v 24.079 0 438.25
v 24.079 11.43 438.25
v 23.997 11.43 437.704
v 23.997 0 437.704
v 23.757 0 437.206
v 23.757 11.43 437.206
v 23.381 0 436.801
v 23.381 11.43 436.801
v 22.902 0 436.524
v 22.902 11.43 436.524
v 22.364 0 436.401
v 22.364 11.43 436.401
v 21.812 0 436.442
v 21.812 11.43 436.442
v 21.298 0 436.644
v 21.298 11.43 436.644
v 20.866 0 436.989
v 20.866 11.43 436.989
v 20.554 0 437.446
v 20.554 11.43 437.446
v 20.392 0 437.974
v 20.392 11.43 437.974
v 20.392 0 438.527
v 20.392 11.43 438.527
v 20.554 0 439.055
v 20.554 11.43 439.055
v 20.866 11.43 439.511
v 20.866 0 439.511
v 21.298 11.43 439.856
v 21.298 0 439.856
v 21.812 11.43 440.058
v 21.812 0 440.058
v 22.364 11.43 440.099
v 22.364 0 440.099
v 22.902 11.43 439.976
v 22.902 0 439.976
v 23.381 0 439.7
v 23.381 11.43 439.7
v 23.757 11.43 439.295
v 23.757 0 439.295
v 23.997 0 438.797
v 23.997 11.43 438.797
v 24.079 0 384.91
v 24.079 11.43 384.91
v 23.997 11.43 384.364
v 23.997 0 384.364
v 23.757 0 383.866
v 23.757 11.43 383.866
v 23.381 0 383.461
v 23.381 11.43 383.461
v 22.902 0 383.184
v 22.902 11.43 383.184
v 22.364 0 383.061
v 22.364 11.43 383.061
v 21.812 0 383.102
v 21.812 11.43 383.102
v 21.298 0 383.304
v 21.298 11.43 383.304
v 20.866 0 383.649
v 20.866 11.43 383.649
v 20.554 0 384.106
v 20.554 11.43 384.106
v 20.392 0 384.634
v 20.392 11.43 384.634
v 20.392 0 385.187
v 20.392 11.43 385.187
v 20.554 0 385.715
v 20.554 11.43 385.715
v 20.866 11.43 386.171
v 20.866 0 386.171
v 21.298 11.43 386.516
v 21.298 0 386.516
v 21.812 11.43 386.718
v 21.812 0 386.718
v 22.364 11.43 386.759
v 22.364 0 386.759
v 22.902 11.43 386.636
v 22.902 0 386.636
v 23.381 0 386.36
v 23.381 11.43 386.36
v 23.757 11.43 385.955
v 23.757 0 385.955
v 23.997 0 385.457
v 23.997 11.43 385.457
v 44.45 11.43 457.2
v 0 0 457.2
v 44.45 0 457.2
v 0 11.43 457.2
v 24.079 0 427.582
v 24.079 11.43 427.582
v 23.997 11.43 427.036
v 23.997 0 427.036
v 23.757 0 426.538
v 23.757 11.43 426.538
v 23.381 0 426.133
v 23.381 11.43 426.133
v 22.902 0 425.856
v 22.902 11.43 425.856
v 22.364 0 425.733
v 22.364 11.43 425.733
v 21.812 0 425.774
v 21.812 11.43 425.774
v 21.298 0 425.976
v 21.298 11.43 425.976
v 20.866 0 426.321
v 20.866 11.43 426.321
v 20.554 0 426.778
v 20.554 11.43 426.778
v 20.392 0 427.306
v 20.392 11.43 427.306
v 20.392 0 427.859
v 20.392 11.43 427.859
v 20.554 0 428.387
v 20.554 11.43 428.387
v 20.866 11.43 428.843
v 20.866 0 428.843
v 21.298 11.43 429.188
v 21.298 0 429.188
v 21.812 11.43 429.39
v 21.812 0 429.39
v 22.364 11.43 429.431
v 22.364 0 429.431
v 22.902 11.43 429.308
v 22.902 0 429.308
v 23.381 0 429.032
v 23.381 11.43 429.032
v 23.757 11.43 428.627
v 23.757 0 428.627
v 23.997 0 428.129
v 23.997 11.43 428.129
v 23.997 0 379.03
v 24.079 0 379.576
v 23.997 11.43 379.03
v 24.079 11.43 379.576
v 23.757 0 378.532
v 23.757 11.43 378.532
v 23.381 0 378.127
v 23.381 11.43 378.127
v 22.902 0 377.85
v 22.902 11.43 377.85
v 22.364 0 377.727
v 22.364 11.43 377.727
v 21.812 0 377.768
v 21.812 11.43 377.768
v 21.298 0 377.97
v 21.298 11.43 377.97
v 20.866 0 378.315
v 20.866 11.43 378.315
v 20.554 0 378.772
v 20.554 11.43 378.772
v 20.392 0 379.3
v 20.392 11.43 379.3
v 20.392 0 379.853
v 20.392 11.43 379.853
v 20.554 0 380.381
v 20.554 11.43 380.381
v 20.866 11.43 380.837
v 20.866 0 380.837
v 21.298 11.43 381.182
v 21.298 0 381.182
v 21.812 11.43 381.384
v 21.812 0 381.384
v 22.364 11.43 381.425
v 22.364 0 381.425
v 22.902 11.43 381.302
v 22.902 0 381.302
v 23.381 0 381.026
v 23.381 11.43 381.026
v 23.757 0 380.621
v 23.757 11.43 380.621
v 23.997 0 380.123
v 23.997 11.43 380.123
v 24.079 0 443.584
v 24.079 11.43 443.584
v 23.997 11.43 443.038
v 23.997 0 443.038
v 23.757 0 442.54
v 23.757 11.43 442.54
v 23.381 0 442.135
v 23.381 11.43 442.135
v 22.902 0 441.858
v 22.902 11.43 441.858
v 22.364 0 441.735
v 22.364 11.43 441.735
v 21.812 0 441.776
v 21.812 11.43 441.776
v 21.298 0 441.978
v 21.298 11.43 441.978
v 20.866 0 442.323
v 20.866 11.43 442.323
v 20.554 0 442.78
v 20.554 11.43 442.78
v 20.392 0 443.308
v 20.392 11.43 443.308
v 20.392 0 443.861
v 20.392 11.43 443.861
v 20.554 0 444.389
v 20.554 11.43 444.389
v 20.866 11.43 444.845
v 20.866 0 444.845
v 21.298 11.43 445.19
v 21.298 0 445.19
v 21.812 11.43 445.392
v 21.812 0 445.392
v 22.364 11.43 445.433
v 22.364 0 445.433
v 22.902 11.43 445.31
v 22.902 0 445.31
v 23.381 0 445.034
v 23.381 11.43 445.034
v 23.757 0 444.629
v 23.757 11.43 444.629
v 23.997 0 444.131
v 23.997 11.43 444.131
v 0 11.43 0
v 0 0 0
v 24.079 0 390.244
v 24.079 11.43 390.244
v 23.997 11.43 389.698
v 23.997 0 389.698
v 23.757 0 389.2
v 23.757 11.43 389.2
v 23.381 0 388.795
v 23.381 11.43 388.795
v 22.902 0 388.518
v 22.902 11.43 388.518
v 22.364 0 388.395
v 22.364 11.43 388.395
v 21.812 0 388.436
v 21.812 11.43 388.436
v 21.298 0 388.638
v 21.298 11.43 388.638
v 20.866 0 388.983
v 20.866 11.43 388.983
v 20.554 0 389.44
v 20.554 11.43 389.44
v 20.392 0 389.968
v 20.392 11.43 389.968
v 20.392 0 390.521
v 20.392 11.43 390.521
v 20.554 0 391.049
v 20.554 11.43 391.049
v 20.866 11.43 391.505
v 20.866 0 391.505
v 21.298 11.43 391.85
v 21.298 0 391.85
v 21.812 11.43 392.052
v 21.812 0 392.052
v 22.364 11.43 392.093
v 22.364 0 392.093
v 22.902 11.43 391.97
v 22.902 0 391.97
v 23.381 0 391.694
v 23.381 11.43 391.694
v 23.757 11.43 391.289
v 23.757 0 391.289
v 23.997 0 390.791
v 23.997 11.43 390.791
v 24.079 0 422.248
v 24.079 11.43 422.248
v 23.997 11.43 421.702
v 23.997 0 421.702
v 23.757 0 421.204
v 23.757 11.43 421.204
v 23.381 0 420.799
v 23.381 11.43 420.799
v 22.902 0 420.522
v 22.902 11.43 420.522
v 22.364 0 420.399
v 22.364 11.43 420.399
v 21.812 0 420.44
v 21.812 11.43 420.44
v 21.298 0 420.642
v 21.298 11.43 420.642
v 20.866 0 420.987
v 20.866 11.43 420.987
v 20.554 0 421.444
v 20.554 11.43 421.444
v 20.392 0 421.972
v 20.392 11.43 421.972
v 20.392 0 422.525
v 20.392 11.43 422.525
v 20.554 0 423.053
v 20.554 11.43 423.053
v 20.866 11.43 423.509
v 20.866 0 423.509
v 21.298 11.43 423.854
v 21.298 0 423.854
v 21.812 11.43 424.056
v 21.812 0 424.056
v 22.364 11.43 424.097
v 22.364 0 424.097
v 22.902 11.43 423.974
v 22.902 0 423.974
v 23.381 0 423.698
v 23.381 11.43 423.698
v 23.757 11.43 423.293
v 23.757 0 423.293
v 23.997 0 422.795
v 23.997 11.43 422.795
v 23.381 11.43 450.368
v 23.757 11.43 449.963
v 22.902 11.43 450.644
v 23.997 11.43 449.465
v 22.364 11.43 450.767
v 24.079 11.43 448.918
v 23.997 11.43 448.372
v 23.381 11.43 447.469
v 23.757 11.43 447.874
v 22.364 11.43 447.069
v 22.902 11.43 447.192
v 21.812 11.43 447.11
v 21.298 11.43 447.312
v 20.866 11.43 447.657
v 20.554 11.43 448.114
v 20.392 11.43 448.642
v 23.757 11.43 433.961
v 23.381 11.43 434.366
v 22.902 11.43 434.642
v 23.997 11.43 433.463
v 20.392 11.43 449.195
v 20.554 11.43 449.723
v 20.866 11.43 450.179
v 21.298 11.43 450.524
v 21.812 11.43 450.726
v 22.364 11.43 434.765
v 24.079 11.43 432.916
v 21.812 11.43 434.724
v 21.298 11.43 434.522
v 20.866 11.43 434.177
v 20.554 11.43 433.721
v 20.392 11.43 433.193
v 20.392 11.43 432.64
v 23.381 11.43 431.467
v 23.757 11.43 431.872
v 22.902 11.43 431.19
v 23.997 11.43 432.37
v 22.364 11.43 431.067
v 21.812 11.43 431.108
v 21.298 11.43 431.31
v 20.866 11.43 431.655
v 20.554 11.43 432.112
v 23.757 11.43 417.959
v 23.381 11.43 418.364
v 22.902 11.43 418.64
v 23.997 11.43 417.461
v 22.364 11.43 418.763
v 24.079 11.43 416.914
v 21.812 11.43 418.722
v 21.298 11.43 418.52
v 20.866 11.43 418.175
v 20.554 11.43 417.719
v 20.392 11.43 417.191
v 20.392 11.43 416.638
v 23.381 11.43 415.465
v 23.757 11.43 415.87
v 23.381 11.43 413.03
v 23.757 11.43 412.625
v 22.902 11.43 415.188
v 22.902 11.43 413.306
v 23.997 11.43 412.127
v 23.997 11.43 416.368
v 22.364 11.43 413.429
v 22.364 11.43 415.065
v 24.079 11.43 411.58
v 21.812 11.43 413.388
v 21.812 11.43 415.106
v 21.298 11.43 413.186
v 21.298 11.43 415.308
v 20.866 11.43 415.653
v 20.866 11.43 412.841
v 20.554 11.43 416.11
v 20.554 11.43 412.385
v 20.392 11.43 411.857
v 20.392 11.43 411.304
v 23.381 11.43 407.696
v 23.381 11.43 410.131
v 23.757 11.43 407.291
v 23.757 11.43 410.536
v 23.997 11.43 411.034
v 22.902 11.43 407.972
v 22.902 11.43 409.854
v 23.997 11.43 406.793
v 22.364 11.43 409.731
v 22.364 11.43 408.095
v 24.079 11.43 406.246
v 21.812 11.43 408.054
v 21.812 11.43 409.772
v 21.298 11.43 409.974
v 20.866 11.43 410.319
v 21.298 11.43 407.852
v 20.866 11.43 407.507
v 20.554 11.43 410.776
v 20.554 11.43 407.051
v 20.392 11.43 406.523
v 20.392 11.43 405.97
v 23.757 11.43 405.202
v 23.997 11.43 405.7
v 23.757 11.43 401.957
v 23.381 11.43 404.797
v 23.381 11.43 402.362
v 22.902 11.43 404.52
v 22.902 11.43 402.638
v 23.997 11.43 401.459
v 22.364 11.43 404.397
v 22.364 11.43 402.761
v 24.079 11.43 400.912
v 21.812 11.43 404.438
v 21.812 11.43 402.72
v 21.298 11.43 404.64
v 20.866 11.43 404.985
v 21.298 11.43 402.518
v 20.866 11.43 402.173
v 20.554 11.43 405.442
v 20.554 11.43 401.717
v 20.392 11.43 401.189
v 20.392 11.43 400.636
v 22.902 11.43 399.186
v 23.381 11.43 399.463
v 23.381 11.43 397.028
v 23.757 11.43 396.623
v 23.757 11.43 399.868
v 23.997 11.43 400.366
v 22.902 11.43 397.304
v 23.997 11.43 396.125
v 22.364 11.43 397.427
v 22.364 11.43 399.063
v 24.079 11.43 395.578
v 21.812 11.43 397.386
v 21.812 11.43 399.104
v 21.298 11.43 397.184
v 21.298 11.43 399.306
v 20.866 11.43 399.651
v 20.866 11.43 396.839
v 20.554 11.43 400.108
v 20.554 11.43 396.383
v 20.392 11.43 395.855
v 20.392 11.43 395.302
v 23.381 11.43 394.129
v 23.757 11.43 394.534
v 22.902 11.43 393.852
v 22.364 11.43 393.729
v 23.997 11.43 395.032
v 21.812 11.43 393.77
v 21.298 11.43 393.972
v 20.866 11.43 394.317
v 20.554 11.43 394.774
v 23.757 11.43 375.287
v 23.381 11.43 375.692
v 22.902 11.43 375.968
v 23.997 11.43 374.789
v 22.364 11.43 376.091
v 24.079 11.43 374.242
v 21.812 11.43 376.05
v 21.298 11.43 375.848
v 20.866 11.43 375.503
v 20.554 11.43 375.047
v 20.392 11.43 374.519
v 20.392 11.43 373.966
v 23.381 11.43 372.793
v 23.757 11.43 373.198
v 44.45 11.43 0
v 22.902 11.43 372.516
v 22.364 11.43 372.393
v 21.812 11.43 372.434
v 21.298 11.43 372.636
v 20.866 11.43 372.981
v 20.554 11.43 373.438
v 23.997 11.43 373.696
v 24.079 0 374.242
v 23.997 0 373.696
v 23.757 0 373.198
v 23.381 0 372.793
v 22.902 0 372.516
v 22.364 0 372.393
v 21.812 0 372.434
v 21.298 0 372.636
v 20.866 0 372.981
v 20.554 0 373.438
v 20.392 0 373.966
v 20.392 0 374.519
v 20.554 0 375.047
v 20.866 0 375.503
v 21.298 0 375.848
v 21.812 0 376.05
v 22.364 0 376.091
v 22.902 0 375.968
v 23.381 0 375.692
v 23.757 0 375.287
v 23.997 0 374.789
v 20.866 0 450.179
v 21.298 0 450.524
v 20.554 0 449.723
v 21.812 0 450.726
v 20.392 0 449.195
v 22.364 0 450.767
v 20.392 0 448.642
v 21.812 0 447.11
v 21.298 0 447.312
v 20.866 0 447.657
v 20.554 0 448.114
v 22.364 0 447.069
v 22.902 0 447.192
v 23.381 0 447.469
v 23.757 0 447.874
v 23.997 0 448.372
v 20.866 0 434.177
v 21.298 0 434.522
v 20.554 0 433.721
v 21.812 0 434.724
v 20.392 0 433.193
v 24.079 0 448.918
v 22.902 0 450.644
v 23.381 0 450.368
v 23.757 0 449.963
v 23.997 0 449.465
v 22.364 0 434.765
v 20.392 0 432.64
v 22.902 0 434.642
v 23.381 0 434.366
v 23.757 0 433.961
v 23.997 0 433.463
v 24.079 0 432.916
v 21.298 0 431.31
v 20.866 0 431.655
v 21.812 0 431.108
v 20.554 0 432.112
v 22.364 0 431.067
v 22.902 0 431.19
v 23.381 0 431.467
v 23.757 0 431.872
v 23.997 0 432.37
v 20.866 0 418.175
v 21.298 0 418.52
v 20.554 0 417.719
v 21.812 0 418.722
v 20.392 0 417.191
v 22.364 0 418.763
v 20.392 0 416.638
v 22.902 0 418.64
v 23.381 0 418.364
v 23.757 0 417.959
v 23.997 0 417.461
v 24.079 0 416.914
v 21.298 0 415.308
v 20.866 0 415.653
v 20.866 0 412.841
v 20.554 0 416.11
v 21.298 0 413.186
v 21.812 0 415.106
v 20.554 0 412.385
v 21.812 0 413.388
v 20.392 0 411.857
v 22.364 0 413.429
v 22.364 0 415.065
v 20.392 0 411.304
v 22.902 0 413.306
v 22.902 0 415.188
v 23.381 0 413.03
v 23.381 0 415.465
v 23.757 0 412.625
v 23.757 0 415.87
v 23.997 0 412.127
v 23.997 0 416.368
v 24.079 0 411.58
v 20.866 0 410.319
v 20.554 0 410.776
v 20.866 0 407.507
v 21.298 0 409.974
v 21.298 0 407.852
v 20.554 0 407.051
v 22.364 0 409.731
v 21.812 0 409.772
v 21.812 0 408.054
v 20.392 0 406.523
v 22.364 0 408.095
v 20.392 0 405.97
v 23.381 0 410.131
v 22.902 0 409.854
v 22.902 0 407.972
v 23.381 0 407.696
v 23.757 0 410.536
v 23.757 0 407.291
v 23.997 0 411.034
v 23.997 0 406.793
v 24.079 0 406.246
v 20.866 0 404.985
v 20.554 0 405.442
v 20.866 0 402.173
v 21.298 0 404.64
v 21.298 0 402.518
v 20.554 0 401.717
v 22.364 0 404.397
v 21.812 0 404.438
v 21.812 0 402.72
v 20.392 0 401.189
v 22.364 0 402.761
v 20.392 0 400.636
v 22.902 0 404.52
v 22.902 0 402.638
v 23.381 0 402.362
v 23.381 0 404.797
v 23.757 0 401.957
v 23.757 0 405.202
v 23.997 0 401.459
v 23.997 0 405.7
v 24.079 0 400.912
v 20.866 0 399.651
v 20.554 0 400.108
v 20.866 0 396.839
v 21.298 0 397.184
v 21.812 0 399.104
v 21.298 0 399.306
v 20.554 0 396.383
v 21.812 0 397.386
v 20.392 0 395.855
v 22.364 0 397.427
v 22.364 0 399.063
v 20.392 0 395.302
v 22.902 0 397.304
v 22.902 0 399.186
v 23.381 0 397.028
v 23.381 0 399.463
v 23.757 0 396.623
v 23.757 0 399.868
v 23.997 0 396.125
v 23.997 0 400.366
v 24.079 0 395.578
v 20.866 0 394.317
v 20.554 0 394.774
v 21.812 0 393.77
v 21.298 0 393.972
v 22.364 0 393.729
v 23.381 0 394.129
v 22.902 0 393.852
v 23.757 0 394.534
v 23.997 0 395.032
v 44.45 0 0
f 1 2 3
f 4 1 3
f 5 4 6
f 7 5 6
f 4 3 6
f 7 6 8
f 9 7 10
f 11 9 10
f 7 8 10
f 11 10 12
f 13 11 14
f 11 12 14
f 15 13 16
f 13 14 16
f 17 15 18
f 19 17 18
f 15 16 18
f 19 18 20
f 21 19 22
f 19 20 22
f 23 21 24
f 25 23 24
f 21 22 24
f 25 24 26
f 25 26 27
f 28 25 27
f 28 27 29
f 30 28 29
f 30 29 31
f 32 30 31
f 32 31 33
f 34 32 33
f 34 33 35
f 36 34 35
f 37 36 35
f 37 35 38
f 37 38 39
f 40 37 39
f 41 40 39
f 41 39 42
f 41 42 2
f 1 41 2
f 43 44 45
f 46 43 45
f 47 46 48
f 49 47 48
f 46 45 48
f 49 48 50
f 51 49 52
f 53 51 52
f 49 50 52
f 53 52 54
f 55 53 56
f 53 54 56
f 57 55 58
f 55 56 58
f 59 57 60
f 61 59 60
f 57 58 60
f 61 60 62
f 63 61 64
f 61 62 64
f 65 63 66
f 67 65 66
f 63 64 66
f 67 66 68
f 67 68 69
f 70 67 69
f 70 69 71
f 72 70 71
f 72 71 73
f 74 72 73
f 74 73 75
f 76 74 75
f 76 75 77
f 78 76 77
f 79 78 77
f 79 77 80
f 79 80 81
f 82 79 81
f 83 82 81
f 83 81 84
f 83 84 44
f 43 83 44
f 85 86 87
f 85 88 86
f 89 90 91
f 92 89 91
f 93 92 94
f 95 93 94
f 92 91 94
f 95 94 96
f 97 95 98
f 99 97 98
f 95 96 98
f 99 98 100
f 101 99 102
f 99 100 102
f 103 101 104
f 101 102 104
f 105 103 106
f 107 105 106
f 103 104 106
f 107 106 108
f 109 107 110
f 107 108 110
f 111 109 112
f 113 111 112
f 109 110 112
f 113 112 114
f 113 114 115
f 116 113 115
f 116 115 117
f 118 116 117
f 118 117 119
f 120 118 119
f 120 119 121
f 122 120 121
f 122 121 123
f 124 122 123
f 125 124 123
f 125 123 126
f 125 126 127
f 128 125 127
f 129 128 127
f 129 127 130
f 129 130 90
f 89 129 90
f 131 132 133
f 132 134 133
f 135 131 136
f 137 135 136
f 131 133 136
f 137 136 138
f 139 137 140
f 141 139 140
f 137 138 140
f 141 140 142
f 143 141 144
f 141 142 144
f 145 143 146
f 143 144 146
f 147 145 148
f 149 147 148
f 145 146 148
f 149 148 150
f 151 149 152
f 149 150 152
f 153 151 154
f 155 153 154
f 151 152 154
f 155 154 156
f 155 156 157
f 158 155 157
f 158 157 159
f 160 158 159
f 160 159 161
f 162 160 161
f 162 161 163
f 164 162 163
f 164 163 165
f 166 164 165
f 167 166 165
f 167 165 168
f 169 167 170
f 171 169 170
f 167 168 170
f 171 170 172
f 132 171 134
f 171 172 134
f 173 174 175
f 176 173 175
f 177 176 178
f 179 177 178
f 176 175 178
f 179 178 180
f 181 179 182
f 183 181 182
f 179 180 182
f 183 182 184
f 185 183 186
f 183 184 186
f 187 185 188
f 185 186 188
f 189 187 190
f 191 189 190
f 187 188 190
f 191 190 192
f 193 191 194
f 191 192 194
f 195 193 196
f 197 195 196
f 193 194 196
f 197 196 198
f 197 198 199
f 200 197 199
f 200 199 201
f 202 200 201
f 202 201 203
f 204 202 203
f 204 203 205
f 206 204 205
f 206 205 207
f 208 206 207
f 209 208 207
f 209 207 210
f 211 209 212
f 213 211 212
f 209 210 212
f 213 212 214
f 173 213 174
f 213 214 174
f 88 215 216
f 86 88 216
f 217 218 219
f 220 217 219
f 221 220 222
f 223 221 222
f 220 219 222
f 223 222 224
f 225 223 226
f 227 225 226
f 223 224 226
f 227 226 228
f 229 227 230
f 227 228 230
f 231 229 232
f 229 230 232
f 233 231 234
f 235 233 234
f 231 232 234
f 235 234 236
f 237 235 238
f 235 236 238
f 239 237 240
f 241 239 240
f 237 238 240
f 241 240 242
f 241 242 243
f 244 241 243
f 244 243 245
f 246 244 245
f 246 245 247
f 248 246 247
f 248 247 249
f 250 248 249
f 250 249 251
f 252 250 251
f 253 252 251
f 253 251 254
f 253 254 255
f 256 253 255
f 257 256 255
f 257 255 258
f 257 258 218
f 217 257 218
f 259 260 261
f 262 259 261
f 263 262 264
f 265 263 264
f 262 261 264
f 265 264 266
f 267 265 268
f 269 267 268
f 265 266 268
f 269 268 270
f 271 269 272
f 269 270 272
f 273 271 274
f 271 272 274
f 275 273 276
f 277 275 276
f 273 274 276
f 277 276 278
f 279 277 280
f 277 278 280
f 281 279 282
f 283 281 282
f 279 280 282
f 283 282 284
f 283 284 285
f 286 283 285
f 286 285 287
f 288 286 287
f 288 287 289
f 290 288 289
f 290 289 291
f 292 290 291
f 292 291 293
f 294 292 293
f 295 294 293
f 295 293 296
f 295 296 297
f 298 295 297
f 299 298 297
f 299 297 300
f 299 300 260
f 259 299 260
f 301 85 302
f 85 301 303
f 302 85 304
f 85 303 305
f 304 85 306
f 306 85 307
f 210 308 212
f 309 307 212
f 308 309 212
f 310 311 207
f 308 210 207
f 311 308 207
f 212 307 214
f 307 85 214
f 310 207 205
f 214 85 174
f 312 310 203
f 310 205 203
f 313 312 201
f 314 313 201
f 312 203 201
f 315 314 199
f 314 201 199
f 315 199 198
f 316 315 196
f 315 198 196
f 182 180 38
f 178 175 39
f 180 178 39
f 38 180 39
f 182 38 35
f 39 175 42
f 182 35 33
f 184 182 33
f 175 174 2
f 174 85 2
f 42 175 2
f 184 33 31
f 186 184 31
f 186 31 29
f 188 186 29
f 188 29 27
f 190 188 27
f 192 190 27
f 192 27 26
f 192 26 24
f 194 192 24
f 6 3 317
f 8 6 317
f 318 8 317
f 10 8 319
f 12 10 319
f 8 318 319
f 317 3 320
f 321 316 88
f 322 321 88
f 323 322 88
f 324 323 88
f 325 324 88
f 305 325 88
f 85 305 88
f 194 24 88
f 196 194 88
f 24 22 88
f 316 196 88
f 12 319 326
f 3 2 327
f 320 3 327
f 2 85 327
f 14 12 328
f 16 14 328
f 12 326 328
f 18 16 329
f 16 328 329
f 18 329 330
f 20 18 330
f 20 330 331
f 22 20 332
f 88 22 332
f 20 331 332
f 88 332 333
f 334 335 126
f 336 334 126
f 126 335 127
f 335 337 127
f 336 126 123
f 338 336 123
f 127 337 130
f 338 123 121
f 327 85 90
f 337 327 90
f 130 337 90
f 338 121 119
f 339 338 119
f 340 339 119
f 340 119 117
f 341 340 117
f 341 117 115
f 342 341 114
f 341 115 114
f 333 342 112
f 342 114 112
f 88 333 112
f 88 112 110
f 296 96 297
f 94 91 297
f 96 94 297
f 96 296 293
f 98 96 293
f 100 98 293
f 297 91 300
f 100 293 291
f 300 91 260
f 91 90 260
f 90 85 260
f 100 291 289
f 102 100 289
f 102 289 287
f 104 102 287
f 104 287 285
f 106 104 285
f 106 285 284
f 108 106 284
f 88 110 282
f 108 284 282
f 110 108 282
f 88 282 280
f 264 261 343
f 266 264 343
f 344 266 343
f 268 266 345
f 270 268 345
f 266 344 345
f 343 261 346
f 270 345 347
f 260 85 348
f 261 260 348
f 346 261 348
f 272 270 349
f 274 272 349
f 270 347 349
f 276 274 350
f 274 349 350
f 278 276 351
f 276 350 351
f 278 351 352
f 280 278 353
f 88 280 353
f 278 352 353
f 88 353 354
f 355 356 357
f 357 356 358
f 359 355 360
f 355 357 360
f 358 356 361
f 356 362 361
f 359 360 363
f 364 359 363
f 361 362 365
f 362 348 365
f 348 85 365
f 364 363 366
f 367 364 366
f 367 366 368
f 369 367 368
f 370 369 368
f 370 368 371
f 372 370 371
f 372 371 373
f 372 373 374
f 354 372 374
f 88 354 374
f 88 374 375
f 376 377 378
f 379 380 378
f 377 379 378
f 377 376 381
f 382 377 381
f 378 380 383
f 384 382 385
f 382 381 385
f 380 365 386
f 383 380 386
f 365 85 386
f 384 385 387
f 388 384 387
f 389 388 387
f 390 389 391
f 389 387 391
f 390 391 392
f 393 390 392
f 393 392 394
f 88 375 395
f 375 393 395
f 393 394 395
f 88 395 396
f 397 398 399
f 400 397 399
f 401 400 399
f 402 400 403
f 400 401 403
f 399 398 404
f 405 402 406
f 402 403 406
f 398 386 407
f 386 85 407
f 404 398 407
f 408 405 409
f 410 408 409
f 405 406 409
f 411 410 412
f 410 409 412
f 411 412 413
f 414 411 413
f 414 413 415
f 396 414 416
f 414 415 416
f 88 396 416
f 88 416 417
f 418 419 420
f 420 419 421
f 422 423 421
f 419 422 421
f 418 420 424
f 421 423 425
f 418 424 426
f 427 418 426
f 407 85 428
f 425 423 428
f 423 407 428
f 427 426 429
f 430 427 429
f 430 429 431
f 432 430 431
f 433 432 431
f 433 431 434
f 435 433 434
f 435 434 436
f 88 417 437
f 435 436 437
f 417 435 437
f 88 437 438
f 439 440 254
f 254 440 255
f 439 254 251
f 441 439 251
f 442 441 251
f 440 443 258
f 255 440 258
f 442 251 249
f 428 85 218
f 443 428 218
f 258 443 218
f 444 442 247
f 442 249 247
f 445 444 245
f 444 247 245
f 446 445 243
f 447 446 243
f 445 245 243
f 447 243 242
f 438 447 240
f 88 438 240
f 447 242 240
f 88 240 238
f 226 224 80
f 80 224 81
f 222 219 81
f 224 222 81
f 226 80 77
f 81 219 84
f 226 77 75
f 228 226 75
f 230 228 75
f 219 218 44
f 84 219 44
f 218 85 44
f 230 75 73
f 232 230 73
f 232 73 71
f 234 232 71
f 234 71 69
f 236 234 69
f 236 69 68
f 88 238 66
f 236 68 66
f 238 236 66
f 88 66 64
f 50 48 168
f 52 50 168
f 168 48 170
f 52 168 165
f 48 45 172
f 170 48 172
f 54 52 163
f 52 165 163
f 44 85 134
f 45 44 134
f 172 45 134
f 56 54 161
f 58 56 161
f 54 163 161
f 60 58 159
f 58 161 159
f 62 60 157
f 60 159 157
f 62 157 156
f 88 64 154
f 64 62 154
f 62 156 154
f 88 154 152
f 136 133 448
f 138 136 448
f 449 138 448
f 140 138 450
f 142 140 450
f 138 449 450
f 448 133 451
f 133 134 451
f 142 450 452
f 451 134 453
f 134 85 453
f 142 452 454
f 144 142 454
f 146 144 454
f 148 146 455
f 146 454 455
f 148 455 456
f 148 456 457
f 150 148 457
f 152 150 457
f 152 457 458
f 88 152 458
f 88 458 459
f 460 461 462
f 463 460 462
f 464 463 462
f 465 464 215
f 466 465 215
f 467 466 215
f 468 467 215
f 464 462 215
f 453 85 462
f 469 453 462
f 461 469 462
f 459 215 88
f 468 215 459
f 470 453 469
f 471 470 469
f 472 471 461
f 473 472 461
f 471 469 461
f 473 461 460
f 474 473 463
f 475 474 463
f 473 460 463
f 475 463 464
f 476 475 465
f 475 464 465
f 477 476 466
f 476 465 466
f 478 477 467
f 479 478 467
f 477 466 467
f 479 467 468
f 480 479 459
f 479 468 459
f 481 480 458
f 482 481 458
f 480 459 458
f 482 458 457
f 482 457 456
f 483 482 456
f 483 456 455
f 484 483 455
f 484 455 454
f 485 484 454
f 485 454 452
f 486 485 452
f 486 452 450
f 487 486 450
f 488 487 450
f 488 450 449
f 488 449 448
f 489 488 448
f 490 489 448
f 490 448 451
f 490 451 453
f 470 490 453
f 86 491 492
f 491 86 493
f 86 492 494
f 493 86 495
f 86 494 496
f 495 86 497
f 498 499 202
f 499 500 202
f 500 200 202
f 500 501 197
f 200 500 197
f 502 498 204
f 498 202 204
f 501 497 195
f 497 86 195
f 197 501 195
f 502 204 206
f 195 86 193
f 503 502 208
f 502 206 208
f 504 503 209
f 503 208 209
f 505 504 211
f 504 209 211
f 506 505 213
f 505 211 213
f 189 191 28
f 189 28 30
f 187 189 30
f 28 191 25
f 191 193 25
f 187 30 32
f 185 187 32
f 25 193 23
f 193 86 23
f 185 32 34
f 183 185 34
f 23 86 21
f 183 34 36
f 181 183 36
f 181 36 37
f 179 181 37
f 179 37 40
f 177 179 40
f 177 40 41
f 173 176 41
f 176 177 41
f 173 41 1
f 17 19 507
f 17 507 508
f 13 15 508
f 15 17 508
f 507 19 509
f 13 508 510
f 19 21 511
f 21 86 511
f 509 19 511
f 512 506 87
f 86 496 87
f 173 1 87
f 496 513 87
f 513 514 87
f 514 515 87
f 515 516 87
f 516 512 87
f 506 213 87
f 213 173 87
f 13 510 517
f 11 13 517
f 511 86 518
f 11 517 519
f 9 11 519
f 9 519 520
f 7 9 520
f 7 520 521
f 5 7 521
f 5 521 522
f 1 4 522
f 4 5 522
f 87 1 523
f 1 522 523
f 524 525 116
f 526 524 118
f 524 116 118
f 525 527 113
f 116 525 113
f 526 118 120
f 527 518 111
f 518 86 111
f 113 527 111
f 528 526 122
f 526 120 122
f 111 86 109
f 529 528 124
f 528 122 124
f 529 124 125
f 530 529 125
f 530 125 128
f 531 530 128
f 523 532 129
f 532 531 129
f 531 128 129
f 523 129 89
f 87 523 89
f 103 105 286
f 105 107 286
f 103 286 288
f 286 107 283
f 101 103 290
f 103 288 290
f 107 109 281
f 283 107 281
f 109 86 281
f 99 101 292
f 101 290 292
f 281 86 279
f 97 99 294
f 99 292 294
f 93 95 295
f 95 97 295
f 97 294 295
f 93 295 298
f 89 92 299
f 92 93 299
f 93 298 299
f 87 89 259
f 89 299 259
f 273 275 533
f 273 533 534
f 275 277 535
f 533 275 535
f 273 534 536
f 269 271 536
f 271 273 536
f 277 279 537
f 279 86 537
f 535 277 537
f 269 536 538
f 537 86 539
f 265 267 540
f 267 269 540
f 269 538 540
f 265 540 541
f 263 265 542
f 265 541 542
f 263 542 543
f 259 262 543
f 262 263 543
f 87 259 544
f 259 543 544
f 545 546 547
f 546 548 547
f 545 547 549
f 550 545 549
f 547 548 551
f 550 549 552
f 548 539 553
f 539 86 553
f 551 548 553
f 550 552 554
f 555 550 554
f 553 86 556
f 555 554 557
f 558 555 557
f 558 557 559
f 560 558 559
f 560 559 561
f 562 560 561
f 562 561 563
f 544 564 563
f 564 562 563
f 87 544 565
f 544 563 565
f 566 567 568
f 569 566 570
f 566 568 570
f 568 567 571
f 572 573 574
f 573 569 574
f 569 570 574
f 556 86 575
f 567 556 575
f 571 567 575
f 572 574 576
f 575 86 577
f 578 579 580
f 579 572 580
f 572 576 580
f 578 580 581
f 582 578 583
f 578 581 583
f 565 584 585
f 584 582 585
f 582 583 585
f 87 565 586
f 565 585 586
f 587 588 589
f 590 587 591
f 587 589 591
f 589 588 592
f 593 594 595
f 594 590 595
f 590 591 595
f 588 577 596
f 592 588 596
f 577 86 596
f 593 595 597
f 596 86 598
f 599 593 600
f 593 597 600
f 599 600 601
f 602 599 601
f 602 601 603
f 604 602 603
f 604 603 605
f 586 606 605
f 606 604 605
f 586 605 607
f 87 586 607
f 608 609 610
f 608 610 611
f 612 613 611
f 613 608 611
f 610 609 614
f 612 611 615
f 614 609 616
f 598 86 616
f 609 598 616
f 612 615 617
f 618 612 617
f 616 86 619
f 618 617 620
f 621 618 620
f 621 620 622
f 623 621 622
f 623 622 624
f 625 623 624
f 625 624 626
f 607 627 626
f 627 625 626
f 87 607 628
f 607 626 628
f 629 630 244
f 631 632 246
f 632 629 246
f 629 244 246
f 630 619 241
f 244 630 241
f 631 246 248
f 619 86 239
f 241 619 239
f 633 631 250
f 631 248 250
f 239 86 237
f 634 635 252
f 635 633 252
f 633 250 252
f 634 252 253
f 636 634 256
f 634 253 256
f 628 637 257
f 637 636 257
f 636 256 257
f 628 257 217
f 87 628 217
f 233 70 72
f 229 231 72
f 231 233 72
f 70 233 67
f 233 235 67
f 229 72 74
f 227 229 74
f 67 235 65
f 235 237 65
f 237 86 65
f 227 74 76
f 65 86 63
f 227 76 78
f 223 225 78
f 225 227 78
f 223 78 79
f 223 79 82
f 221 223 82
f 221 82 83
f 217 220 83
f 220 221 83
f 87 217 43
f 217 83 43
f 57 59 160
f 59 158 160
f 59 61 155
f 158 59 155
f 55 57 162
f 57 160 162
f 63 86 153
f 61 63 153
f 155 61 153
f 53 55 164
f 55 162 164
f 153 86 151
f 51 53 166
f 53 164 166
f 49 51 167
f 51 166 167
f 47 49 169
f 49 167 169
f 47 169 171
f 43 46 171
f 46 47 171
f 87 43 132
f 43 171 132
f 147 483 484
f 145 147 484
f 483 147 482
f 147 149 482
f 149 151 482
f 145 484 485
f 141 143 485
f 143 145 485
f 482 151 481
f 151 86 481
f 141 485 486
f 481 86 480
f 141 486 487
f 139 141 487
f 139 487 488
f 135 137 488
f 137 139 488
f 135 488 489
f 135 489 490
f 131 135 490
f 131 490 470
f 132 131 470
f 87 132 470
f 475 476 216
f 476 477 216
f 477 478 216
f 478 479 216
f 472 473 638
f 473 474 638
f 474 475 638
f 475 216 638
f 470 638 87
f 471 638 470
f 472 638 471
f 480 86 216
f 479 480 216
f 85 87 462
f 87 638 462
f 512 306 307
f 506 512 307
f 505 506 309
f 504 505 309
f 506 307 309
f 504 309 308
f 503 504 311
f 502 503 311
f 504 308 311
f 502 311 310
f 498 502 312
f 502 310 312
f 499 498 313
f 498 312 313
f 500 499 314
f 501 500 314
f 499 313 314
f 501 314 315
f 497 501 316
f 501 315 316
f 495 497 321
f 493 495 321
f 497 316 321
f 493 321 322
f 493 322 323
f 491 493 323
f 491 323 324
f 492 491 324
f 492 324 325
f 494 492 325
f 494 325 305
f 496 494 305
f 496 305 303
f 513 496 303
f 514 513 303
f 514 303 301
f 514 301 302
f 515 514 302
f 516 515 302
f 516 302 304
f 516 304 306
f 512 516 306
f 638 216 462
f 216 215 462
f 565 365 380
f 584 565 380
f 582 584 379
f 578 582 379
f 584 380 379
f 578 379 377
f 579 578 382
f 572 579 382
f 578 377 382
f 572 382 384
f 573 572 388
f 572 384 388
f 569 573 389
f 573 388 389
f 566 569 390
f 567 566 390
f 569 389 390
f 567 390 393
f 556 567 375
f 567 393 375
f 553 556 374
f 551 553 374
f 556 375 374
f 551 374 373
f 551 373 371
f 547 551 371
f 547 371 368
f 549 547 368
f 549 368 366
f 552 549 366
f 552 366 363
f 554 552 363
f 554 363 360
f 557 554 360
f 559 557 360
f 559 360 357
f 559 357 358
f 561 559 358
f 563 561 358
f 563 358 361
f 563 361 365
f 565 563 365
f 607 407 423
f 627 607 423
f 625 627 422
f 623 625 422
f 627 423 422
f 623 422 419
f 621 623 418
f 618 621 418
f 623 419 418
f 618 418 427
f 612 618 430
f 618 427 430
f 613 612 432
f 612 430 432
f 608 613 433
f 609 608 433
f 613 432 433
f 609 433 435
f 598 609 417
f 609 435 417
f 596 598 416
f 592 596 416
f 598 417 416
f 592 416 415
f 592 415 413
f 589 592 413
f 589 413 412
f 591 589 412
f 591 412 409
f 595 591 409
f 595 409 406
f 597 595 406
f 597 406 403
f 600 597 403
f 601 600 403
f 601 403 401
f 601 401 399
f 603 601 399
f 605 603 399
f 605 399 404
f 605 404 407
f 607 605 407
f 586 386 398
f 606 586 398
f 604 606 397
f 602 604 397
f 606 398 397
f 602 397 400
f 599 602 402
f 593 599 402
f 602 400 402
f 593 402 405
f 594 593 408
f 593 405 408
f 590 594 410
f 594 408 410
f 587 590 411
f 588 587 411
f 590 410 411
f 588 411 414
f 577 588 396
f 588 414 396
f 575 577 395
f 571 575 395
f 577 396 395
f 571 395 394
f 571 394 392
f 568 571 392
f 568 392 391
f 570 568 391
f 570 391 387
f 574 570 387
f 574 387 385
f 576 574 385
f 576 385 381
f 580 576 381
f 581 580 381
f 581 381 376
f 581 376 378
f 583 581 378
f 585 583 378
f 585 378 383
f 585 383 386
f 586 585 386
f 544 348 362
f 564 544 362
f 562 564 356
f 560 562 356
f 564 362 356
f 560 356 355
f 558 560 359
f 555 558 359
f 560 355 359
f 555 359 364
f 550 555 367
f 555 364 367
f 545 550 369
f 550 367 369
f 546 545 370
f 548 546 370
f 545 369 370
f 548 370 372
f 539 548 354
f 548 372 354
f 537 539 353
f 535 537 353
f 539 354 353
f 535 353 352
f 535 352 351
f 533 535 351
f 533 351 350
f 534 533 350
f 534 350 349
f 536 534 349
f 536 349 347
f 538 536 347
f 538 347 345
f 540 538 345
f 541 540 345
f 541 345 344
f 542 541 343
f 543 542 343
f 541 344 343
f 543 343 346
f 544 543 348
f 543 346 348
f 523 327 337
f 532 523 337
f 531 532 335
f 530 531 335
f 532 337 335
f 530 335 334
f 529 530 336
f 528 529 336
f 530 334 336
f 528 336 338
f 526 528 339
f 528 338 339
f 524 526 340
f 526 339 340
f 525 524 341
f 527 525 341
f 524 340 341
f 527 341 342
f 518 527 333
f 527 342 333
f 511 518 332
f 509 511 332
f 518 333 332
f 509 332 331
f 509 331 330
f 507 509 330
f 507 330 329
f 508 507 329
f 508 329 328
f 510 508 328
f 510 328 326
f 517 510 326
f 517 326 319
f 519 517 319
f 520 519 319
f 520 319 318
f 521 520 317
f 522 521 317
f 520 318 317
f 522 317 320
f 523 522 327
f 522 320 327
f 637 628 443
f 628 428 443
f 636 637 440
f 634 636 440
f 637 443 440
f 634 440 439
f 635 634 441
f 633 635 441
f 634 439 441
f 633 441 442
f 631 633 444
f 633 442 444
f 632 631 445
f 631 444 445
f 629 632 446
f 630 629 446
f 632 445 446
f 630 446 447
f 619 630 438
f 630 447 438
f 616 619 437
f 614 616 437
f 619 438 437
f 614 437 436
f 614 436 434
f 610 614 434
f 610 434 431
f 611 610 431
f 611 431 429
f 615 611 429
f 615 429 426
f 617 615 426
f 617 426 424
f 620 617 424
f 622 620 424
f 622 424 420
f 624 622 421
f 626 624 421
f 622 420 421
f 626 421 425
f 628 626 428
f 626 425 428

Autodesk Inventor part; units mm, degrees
ref_plane "YZ Plane" through (0, 0, 0) normal (1, 0, 0) x (0, 1, 0)
ref_plane "XZ Plane" through (0, 0, 0) normal (0, 1, 0) x (-1, 0, 0)
ref_plane "XY Plane" through (0, 0, 0) normal (0, 0, 1) x (1, 0, 0)
sketch "Sketch1" plane through (0, 0, 0) normal (0, 0, 1) x (1, 0, 0)
  line L0 (0, 0) -> (44.45, 0)
  line L1 (44.45, 0) -> (44.45, 11.43)
  line L2 (44.45, 11.43) -> (0, 11.43)
  line L3 (0, 11.43) -> (0, 0)
  dimension "d0" = 44.45
  dimension "d1" = 11.43
extrude "Extrusion1" add sketch "Sketch1" along normal blind 457.2
ref_plane "Work Plane1" through (22.225, 0, 0) normal (1, 0, 0) x (0, 0, -1)
sketch "Sketch2" plane through (0, 11.43, 0) normal (0, 1, 0) x (1, 0, 0)
  circle A0 centre (22.225, -448.9182) radius 1.8542
  dimension "d4" = 3.7084
extrude "Extrusion2" cut sketch "Sketch2" against normal blind 25.4
pattern_linear "Rectangular Pattern1" count 15 spacing 5.334 along (0, 0, -1) of "Extrusion2"
properties part number "16 Drawer Slide"
